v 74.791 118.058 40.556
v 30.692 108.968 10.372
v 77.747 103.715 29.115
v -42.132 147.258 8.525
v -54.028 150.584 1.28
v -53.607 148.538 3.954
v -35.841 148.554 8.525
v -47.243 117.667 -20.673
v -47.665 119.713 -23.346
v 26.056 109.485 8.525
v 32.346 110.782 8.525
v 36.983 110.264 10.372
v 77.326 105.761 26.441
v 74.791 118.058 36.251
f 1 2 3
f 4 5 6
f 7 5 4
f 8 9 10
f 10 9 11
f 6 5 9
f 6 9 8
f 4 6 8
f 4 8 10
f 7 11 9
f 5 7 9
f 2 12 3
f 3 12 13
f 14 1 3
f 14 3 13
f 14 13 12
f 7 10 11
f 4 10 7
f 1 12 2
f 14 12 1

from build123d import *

# Parameters (mm, degrees)
BOSS_EXTRUDE3_DEPTH = 40
CUT_EXTRUDE1_DEPTH  = 58.863715208


with BuildPart() as part:
    # Sketch6 → Boss-Extrude3 (new body)
    with BuildSketch(Plane(origin=(-13.618312045, 66.066458327, 52.70195964), x_dir=(0.984335136, 0.075994886, 0.159088393), z_dir=(-0.159088393, 0.771784835, 0.615661475))):
        Polygon((89.043125981, 48.915913578), (88.358150123, 52.238933995), (-41.534636191, 89.973908512), (-40.849660333, 86.650888095), align=None)
    extrude(amount=BOSS_EXTRUDE3_DEPTH)

    # Sketch7 → Cut-Extrude1 (cut, through all)
    with BuildSketch(Plane(origin=(-20.295100688, 98.457534195, 0), x_dir=(0.968832963, 0.199706022, 0.146561234), z_dir=(-0.201886069, 0.979409013, 0))):
        Polygon((-12.235949059, -131.74056907), (234.668770197, -95.158885), (217.081422087, 23.54530695), (-29.823297169, -13.03637712), align=None)
    extrude(amount=CUT_EXTRUDE1_DEPTH, mode=Mode.SUBTRACT)


solid = part.part
